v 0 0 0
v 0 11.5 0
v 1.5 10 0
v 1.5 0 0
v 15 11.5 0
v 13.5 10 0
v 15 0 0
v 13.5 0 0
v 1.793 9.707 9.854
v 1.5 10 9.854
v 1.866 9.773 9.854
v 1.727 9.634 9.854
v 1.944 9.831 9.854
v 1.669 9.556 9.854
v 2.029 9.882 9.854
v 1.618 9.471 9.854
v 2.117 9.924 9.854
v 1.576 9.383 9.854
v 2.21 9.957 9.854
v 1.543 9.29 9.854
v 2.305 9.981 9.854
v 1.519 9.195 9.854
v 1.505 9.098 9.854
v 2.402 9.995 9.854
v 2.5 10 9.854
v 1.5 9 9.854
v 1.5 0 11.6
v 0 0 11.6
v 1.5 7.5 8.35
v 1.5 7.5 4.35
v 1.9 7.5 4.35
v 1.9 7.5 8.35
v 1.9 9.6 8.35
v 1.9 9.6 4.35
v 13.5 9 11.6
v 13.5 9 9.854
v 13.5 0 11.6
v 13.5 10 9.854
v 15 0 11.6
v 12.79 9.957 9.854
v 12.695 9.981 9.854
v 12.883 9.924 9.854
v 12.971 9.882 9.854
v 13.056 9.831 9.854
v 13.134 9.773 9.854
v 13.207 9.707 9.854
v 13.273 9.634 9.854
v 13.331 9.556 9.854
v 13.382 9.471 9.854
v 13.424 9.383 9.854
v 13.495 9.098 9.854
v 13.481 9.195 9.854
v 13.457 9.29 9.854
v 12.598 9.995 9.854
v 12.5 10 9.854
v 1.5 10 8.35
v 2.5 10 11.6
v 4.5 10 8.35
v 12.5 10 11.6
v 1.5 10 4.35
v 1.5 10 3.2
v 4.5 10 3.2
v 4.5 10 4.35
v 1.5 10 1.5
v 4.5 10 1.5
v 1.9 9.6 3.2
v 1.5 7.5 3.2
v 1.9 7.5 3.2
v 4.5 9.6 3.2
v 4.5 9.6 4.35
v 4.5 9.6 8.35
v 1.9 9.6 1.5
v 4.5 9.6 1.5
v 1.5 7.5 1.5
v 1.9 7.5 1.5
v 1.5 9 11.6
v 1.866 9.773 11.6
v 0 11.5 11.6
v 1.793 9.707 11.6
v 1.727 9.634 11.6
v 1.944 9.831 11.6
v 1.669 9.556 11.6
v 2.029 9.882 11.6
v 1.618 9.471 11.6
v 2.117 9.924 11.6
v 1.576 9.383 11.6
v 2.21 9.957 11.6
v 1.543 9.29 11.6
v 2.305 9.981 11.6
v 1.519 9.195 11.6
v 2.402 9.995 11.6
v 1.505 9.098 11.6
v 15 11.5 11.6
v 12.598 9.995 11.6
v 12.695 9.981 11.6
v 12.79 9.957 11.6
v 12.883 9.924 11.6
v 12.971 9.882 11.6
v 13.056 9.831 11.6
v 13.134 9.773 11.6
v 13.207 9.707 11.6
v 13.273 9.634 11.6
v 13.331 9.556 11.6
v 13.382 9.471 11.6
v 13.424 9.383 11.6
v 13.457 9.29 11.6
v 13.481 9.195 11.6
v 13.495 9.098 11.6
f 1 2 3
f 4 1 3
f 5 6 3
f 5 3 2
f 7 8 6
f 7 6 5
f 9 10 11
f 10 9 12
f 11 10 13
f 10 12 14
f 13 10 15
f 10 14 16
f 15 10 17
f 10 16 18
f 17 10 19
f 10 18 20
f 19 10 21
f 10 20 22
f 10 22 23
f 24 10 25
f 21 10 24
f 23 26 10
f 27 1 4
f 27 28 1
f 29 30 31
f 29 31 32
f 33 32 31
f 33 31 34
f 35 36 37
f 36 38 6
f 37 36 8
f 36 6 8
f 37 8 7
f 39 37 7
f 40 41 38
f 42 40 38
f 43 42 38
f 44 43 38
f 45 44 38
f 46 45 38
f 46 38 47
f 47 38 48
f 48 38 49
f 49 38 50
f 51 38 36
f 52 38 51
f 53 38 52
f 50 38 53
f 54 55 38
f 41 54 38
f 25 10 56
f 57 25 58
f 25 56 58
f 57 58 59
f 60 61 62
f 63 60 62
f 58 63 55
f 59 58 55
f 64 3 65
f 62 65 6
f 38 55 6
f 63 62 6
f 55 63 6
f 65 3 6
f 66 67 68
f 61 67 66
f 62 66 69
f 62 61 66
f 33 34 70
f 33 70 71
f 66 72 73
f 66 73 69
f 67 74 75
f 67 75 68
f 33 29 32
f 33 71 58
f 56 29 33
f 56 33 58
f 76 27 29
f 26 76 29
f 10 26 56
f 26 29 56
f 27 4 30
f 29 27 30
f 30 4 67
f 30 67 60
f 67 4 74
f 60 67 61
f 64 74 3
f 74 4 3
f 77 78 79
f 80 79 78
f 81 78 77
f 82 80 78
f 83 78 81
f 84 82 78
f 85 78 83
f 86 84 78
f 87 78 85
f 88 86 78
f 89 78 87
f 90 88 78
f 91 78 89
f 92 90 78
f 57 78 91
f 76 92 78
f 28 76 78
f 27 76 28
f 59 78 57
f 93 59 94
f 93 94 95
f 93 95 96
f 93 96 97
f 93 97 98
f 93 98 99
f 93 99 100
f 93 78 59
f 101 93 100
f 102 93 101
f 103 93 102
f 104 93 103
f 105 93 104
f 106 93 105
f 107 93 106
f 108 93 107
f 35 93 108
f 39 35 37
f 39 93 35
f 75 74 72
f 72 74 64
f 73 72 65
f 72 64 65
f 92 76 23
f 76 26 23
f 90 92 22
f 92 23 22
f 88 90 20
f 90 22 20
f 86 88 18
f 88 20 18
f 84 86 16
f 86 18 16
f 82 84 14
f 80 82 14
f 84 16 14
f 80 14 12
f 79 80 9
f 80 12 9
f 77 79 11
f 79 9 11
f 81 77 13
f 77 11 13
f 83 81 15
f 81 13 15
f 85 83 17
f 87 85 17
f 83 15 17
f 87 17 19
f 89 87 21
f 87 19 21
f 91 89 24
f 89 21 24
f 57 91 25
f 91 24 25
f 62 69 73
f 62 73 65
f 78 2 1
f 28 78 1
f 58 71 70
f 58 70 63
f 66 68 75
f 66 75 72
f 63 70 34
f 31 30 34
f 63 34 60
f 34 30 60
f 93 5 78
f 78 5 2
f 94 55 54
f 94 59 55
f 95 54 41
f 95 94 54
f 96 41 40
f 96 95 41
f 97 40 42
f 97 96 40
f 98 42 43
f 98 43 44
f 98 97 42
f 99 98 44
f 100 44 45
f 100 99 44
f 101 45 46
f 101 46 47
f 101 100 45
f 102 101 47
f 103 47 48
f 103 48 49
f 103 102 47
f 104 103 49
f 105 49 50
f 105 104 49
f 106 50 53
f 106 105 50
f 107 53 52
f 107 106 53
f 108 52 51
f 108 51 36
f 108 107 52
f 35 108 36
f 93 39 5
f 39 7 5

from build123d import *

# Parameters (mm, degrees)
BOSS_EXTRUDE1_DEPTH      = 17
SKETCH10_W               = 3
SKETCH10_H               = 4
SKETCH10_H_2             = 2
BOSS_EXTRUDE8_DEPTH      = 0.4
SKETCH11_W               = 2
SKETCH11_H               = 2.1
SKETCH11_W_2             = 4
BOSS_EXTRUDE9_DEPTH      = 0.4
FILLET5_R                = 0.4
SPLIT2_SURFACE_1_BACK    = 26.421
SPLIT2_SURFACE_1_DEPTH   = 52.842
SPLIT2_SURFACE_2_BACK    = 26.421
SPLIT2_SURFACE_2_DEPTH   = 52.842
FILLET6_R                = 1.5
SKETCH13_W               = 5.8
SKETCH13_H               = 8.5
BOSS_EXTRUDE10_DEPTH     = 3
FILLET7_R                = 4
SPLIT3_SURFACE_3_BACK    = 34.598
SPLIT3_SURFACE_3_DEPTH   = 69.196
SPLIT3_SURFACE_4_BACK    = 34.598
SPLIT3_SURFACE_4_DEPTH   = 69.196
CUT_EXTRUDE1_DEPTH       = 1.5
CUT_EXTRUDE2_DEPTH       = 29.664263465
DELETEFACE1_START        = 1.5
DELETEFACE1_DEPTH        = 12
CUT_EXTRUDE3_DEPTH       = 8
MOVE_START               = 1.5
MOVE_FACE1_OUTLINE_W     = 2.5
MOVE_FACE1_OUTLINE_H     = 4
MOVE_FACE1_OUTLINE_H_2   = 2
MOVE_FACE1_DEPTH         = 3
MOVE_FACE1_2_OUTLINE_W   = 0.4
MOVE_FACE1_2_OUTLINE_H   = 2
MOVE_FACE1_2_OUTLINE_H_2 = 4
MOVE_FACE1_2_DEPTH       = 3
MOVE_FACE1_3_OUTLINE_W   = 2.1
MOVE_FACE1_3_OUTLINE_H   = 2
MOVE_FACE1_3_OUTLINE_H_2 = 4
MOVE_FACE1_3_DEPTH       = 0.4
CUT_EXTRUDE4_DEPTH       = 25.456900867
CUT_EXTRUDE4_DEPTH_BACK  = 25.456900867
SPLIT4_SURFACE_5_BACK    = 32.215
SPLIT4_SURFACE_5_DEPTH   = 64.43
SPLIT4_SURFACE_6_BACK    = 32.215
SPLIT4_SURFACE_6_DEPTH   = 64.43
FILLET8_R                = 1
MOVE_START_2             = 1.35
MOVE_FACE2_DEPTH         = 0.15
MOVE_START_3             = 3.2
MOVE_FACE2_2_DEPTH       = 0.15
SPLIT5_START             = -5.8
SPLIT5_OUTLINE_W         = 3
SPLIT5_OUTLINE_H         = 8.5
SPLIT5_DEPTH             = 5.8
SPLIT5_START_2           = 15
SPLIT5_2_OUTLINE_W       = 3
SPLIT5_2_OUTLINE_H       = 8.5
SPLIT5_2_DEPTH           = 5.8
DELETEFACE2_DEPTH        = 1.5
DELETEFACE2_START        = 13.5
DELETEFACE2_2_DEPTH      = 1.5


# Read off the part's stored shape, not the designer's step: DeleteFace1, Move Face1, Move Face2, Split5, DeleteFace2
with BuildPart() as part:
    # Sketch1 → Boss-Extrude1 (new body)
    with BuildSketch(Plane.XY):
        Polygon((0, 0), (1.5, 0), (1.5, 10), (13.5, 10), (13.5, 0), (15, 0), (15, 11.5), (0, 11.5), (0, 10), align=None)
    extrude(amount=BOSS_EXTRUDE1_DEPTH)

    # Sketch10 → Boss-Extrude8 (add)
    with BuildSketch(Plane.XZ.offset(-10)):
        with Locations((12, 14)):
            Rectangle(SKETCH10_W, SKETCH10_H)
        with Locations((12, 10)):
            Rectangle(SKETCH10_W, SKETCH10_H_2)
    boss_extrude8 = extrude(amount=BOSS_EXTRUDE8_DEPTH)

    # Sketch11 → Boss-Extrude9 (add)
    with BuildSketch(Plane.ZY.offset(-13.5)):
        with Locations((10, 8.55)):
            Rectangle(SKETCH11_W, SKETCH11_H)
        with Locations((14, 8.55)):
            Rectangle(SKETCH11_W_2, SKETCH11_H)
    boss_extrude9 = extrude(amount=BOSS_EXTRUDE9_DEPTH)

    # Fillet5
    fillet5_edges = [part.edges().sort_by_distance(p)[0] for p in [
        (13.1, 9.6, 10),
        (13.1, 9.6, 14),
    ]]
    fillet(fillet5_edges, radius=FILLET5_R)


with BuildPart() as body_2:
    # Split2: the piece behind the surface
    add(part.part)
    # Split2 surface: a surface, the sketch's curves swept straight by 52.842 mm
    with BuildLine(Plane.XZ.offset(-SPLIT2_SURFACE_1_BACK), mode=Mode.PRIVATE) as split2_surface_1_path:
        Line((15, 8), (0, 8))
    split2_surface_1 = Shell.extrude(split2_surface_1_path.wire(), (0 * SPLIT2_SURFACE_1_DEPTH, -1 * SPLIT2_SURFACE_1_DEPTH, 0 * SPLIT2_SURFACE_1_DEPTH))
    split(bisect_by=split2_surface_1, keep=Keep.BOTTOM)


with BuildPart() as part_1:
    add(part.part)

    # Split2: split by a surface, the side it looks to stays
    # Split2 surface: a surface, the sketch's curves swept straight by 52.842 mm
    with BuildLine(Plane.XZ.offset(-SPLIT2_SURFACE_2_BACK), mode=Mode.PRIVATE) as split2_surface_2_path:
        Line((15, 8), (0, 8))
    split2_surface_2 = Shell.extrude(split2_surface_2_path.wire(), (0 * SPLIT2_SURFACE_2_DEPTH, -1 * SPLIT2_SURFACE_2_DEPTH, 0 * SPLIT2_SURFACE_2_DEPTH))
    split(bisect_by=split2_surface_2, keep=Keep.TOP)

    # Fillet6
    fillet6_edges = [part_1.edges().sort_by_distance(p)[0] for p in [
        (13.5, 10, 4),
        (1.5, 10, 4),
    ]]
    fillet(fillet6_edges, radius=FILLET6_R)


with BuildPart() as body_2_1:
    add(body_2.part)

    # Combine2: union part
    add(part_1.part)

    # Sketch13 → Boss-Extrude10 (add)
    with BuildSketch(Plane.XZ):
        with Locations((-2.9, 4.25)):
            Rectangle(SKETCH13_W, SKETCH13_H)
        with Locations((17.9, 4.25)):
            Rectangle(SKETCH13_W, SKETCH13_H)
    extrude(amount=-BOSS_EXTRUDE10_DEPTH)

    # Fillet7
    fillet7_edges = [body_2_1.edges().sort_by_distance(p)[0] for p in [
        (20.8, 1.5, 8.5),
        (20.8, 1.5, 0),
        (-5.8, 1.5, 0),
        (-5.8, 1.5, 8.5),
    ]]
    fillet(fillet7_edges, radius=FILLET7_R)


with BuildPart() as body_2_2:
    # Split3: the piece behind the surface
    add(body_2_1.part)
    # Split3 surface: a surface, the sketch's curves swept straight by 69.196 mm
    with BuildLine(Plane.ZY.offset(-SPLIT3_SURFACE_3_BACK), mode=Mode.PRIVATE) as split3_surface_3_path:
        Line((0, 3), (17, 3))
    split3_surface_3 = Shell.extrude(split3_surface_3_path.wire(), (-1 * SPLIT3_SURFACE_3_DEPTH, 0 * SPLIT3_SURFACE_3_DEPTH, 0 * SPLIT3_SURFACE_3_DEPTH))
    split(bisect_by=split3_surface_3, keep=Keep.BOTTOM)

    # Sketch16 → Cut-Extrude1 (cut)
    with BuildSketch(Plane(origin=(0, 3, 0), x_dir=(1, 0, 0), z_dir=(0, 1, 0))):
        Polygon((-1, -7.136751346), (1.5, -5.693375673), (1.5, -2.806624327), (-1, -1.363248654), (-3.5, -2.806624327), (-3.5, -5.693375673), align=None)
        Polygon((16, -1.363248654), (13.5, -2.806624327), (13.5, -5.693375673), (16, -7.136751346), (18.5, -5.693375673), (18.5, -2.806624327), align=None)
    extrude(amount=-CUT_EXTRUDE1_DEPTH, mode=Mode.SUBTRACT)

    # Sketch17 → Cut-Extrude2 (cut, through all)
    with BuildSketch(Plane(origin=(0, 1.5, 0), x_dir=(1, 0, 0), z_dir=(0, 1, 0))):
        with BuildLine():
            Line((16, -5.25), (13.5, -5.25))
            Line((13.5, -5.25), (13.5, -3.25))
            Line((13.5, -3.25), (16, -3.25))
            ThreePointArc((16, -3.25), (17, -4.25), (16, -5.25))
        make_face()
        with BuildLine():
            Line((1.5, -3.25), (1.5, -5.25))
            Line((1.5, -5.25), (-1, -5.25))
            ThreePointArc((-1, -5.25), (-2, -4.25), (-1, -3.25))
            Line((-1, -3.25), (1.5, -3.25))
        make_face()
    extrude(amount=-CUT_EXTRUDE2_DEPTH, mode=Mode.SUBTRACT)


with BuildPart() as body_2_3:
    add(body_2_1.part)

    # Split3: split by a surface, the side it looks to stays
    # Split3 surface: a surface, the sketch's curves swept straight by 69.196 mm
    with BuildLine(Plane.ZY.offset(-SPLIT3_SURFACE_4_BACK), mode=Mode.PRIVATE) as split3_surface_4_path:
        Line((0, 3), (17, 3))
    split3_surface_4 = Shell.extrude(split3_surface_4_path.wire(), (-1 * SPLIT3_SURFACE_4_DEPTH, 0 * SPLIT3_SURFACE_4_DEPTH, 0 * SPLIT3_SURFACE_4_DEPTH))
    split(bisect_by=split3_surface_4, keep=Keep.TOP)

    # Combine3: union body 2 2
    add(body_2_2.part)

    # DeleteFace1 outline → DeleteFace1 (cut)
    with BuildSketch(Plane.YZ.offset(DELETEFACE1_START)):
        Polygon((10, -1), (10, 8), (10, 9), (7, 9), (7, -1), align=None)
    extrude(amount=DELETEFACE1_DEPTH, mode=Mode.SUBTRACT)

    # Mirror1: Boss-Extrude8, Boss-Extrude9 across plane
    add(boss_extrude8.mirror(Plane.ZY.offset(-7.5)))
    add(boss_extrude9.mirror(Plane.ZY.offset(-7.5)))

    # Sketch18 → Cut-Extrude3 (cut)
    with BuildSketch(Plane.XY.offset(16)):
        with BuildLine():
            Line((13.5, 10), (10.5, 10))
            Line((10.5, 10), (10.5, 9.6))
            Line((10.5, 9.6), (12.7, 9.6))
            ThreePointArc((12.7, 9.6), (12.982842712, 9.482842712), (13.1, 9.2))
            Line((13.1, 9.2), (13.1, 7.5))
            Line((13.1, 7.5), (13.5, 7.5))
            Line((13.5, 7.5), (13.5, 10))
        make_face()
    extrude(amount=-CUT_EXTRUDE3_DEPTH, mode=Mode.SUBTRACT)

    # Move Face1 outline → Move Face1 (cut)
    with BuildSketch(Plane.YZ.offset(MOVE_START)):
        with Locations((8.75, 14)):
            Rectangle(MOVE_FACE1_OUTLINE_W, MOVE_FACE1_OUTLINE_H)
        with Locations((8.75, 10)):
            Rectangle(MOVE_FACE1_OUTLINE_W, MOVE_FACE1_OUTLINE_H_2)
    extrude(amount=MOVE_FACE1_DEPTH, mode=Mode.SUBTRACT)

    # Move Face1 2 outline → Move Face1 2 (add)
    with BuildSketch(Plane.YZ.offset(MOVE_START)):
        with Locations((9.8, 2.35)):
            Rectangle(MOVE_FACE1_2_OUTLINE_W, MOVE_FACE1_2_OUTLINE_H)
        with Locations((9.8, 6.35)):
            Rectangle(MOVE_FACE1_2_OUTLINE_W, MOVE_FACE1_2_OUTLINE_H_2)
    extrude(amount=MOVE_FACE1_2_DEPTH)

    # Move Face1 3 outline → Move Face1 3 (add)
    with BuildSketch(Plane.YZ.offset(MOVE_START)):
        with Locations((8.55, 2.35)):
            Rectangle(MOVE_FACE1_3_OUTLINE_W, MOVE_FACE1_3_OUTLINE_H)
        with Locations((8.55, 6.35)):
            Rectangle(MOVE_FACE1_3_OUTLINE_W, MOVE_FACE1_3_OUTLINE_H_2)
    extrude(amount=MOVE_FACE1_3_DEPTH)

    # Sketch19 → Cut-Extrude4 (cut, two sides: drawn at the far end of the back side and taken through both)
    with BuildSketch(Plane.ZY.offset(-7.5).offset(-CUT_EXTRUDE4_DEPTH_BACK)):
        Polygon((11.6, 62.452218571), (11.6, 13.786177198), (11.6, -3.966275857), (11.6, -52.632317231), (108.932082748, -52.632317231), (108.932082748, 62.452218571), align=None)
    extrude(amount=CUT_EXTRUDE4_DEPTH + CUT_EXTRUDE4_DEPTH_BACK, mode=Mode.SUBTRACT)


with BuildPart() as body_2_3_1:
    # Split4: the piece behind the surface
    add(body_2_3.part)
    # Split4 surface: a surface, the sketch's curves swept straight by 64.43 mm
    with BuildLine(Plane.ZY.offset(-7.5).offset(-SPLIT4_SURFACE_5_BACK), mode=Mode.PRIVATE) as split4_surface_5_path:
        Line((9.853674878, 13.930908587), (9.853674878, -3.706091584))
    split4_surface_5 = Shell.extrude(split4_surface_5_path.wire(), (-1 * SPLIT4_SURFACE_5_DEPTH, 0 * SPLIT4_SURFACE_5_DEPTH, 0 * SPLIT4_SURFACE_5_DEPTH))
    split(bisect_by=split4_surface_5, keep=Keep.BOTTOM)


with BuildPart() as body_2_4:
    add(body_2_3.part)

    # Split4: split by a surface, the side it looks to stays
    # Split4 surface: a surface, the sketch's curves swept straight by 64.43 mm
    with BuildLine(Plane.ZY.offset(-7.5).offset(-SPLIT4_SURFACE_6_BACK), mode=Mode.PRIVATE) as split4_surface_6_path:
        Line((9.853674878, 13.930908587), (9.853674878, -3.706091584))
    split4_surface_6 = Shell.extrude(split4_surface_6_path.wire(), (-1 * SPLIT4_SURFACE_6_DEPTH, 0 * SPLIT4_SURFACE_6_DEPTH, 0 * SPLIT4_SURFACE_6_DEPTH))
    split(bisect_by=split4_surface_6, keep=Keep.TOP)

    # Fillet8
    fillet8_edges = [body_2_4.edges().sort_by_distance(p)[0] for p in [
        (1.5, 10, 10.726837439),
        (13.5, 10, 10.726837439),
    ]]
    fillet(fillet8_edges, radius=FILLET8_R)

    # Combine4: union body 2 3
    add(body_2_3_1.part)

    # Move Face2 outline → Move Face2 (cut)
    with BuildSketch(Plane.XY.offset(MOVE_START_2)):
        Polygon((4.5, 10), (1.5, 10), (1.5, 7.5), (1.9, 7.5), (1.9, 9.6), (4.5, 9.6), align=None)
    extrude(amount=MOVE_FACE2_DEPTH, mode=Mode.SUBTRACT)

    # Move Face2 2 outline → Move Face2 2 (cut)
    with BuildSketch(Plane.XY.offset(MOVE_START_3)):
        Polygon((4.5, 10), (1.5, 10), (1.5, 7.5), (1.9, 7.5), (1.9, 9.6), (4.5, 9.6), align=None)
    extrude(amount=MOVE_FACE2_2_DEPTH, mode=Mode.SUBTRACT)

    # Split5 outline → Split5 (cut)
    with BuildSketch(Plane.YZ.offset(SPLIT5_START)):
        with Locations((1.5, 4.25)):
            Rectangle(SPLIT5_OUTLINE_W, SPLIT5_OUTLINE_H)
    extrude(amount=SPLIT5_DEPTH, mode=Mode.SUBTRACT)

    # Split5 2 outline → Split5 2 (cut)
    with BuildSketch(Plane.YZ.offset(SPLIT5_START_2)):
        with Locations((1.5, 4.25)):
            Rectangle(SPLIT5_2_OUTLINE_W, SPLIT5_2_OUTLINE_H)
    extrude(amount=SPLIT5_2_DEPTH, mode=Mode.SUBTRACT)

    # DeleteFace2 outline → DeleteFace2 (add)
    with BuildSketch(Plane.YZ):
        Polygon((0, 3.25), (0, 0), (4, 0), (4, 8), (0, 8), (0, 5.25), align=None)
    extrude(amount=DELETEFACE2_DEPTH)

    # DeleteFace2 2 outline → DeleteFace2 2 (add)
    with BuildSketch(Plane.YZ.offset(DELETEFACE2_START)):
        Polygon((0, 3.25), (0, 0), (4, 0), (4, 8), (0, 8), (0, 5.25), align=None)
    extrude(amount=DELETEFACE2_2_DEPTH)


solid = body_2_4.part
